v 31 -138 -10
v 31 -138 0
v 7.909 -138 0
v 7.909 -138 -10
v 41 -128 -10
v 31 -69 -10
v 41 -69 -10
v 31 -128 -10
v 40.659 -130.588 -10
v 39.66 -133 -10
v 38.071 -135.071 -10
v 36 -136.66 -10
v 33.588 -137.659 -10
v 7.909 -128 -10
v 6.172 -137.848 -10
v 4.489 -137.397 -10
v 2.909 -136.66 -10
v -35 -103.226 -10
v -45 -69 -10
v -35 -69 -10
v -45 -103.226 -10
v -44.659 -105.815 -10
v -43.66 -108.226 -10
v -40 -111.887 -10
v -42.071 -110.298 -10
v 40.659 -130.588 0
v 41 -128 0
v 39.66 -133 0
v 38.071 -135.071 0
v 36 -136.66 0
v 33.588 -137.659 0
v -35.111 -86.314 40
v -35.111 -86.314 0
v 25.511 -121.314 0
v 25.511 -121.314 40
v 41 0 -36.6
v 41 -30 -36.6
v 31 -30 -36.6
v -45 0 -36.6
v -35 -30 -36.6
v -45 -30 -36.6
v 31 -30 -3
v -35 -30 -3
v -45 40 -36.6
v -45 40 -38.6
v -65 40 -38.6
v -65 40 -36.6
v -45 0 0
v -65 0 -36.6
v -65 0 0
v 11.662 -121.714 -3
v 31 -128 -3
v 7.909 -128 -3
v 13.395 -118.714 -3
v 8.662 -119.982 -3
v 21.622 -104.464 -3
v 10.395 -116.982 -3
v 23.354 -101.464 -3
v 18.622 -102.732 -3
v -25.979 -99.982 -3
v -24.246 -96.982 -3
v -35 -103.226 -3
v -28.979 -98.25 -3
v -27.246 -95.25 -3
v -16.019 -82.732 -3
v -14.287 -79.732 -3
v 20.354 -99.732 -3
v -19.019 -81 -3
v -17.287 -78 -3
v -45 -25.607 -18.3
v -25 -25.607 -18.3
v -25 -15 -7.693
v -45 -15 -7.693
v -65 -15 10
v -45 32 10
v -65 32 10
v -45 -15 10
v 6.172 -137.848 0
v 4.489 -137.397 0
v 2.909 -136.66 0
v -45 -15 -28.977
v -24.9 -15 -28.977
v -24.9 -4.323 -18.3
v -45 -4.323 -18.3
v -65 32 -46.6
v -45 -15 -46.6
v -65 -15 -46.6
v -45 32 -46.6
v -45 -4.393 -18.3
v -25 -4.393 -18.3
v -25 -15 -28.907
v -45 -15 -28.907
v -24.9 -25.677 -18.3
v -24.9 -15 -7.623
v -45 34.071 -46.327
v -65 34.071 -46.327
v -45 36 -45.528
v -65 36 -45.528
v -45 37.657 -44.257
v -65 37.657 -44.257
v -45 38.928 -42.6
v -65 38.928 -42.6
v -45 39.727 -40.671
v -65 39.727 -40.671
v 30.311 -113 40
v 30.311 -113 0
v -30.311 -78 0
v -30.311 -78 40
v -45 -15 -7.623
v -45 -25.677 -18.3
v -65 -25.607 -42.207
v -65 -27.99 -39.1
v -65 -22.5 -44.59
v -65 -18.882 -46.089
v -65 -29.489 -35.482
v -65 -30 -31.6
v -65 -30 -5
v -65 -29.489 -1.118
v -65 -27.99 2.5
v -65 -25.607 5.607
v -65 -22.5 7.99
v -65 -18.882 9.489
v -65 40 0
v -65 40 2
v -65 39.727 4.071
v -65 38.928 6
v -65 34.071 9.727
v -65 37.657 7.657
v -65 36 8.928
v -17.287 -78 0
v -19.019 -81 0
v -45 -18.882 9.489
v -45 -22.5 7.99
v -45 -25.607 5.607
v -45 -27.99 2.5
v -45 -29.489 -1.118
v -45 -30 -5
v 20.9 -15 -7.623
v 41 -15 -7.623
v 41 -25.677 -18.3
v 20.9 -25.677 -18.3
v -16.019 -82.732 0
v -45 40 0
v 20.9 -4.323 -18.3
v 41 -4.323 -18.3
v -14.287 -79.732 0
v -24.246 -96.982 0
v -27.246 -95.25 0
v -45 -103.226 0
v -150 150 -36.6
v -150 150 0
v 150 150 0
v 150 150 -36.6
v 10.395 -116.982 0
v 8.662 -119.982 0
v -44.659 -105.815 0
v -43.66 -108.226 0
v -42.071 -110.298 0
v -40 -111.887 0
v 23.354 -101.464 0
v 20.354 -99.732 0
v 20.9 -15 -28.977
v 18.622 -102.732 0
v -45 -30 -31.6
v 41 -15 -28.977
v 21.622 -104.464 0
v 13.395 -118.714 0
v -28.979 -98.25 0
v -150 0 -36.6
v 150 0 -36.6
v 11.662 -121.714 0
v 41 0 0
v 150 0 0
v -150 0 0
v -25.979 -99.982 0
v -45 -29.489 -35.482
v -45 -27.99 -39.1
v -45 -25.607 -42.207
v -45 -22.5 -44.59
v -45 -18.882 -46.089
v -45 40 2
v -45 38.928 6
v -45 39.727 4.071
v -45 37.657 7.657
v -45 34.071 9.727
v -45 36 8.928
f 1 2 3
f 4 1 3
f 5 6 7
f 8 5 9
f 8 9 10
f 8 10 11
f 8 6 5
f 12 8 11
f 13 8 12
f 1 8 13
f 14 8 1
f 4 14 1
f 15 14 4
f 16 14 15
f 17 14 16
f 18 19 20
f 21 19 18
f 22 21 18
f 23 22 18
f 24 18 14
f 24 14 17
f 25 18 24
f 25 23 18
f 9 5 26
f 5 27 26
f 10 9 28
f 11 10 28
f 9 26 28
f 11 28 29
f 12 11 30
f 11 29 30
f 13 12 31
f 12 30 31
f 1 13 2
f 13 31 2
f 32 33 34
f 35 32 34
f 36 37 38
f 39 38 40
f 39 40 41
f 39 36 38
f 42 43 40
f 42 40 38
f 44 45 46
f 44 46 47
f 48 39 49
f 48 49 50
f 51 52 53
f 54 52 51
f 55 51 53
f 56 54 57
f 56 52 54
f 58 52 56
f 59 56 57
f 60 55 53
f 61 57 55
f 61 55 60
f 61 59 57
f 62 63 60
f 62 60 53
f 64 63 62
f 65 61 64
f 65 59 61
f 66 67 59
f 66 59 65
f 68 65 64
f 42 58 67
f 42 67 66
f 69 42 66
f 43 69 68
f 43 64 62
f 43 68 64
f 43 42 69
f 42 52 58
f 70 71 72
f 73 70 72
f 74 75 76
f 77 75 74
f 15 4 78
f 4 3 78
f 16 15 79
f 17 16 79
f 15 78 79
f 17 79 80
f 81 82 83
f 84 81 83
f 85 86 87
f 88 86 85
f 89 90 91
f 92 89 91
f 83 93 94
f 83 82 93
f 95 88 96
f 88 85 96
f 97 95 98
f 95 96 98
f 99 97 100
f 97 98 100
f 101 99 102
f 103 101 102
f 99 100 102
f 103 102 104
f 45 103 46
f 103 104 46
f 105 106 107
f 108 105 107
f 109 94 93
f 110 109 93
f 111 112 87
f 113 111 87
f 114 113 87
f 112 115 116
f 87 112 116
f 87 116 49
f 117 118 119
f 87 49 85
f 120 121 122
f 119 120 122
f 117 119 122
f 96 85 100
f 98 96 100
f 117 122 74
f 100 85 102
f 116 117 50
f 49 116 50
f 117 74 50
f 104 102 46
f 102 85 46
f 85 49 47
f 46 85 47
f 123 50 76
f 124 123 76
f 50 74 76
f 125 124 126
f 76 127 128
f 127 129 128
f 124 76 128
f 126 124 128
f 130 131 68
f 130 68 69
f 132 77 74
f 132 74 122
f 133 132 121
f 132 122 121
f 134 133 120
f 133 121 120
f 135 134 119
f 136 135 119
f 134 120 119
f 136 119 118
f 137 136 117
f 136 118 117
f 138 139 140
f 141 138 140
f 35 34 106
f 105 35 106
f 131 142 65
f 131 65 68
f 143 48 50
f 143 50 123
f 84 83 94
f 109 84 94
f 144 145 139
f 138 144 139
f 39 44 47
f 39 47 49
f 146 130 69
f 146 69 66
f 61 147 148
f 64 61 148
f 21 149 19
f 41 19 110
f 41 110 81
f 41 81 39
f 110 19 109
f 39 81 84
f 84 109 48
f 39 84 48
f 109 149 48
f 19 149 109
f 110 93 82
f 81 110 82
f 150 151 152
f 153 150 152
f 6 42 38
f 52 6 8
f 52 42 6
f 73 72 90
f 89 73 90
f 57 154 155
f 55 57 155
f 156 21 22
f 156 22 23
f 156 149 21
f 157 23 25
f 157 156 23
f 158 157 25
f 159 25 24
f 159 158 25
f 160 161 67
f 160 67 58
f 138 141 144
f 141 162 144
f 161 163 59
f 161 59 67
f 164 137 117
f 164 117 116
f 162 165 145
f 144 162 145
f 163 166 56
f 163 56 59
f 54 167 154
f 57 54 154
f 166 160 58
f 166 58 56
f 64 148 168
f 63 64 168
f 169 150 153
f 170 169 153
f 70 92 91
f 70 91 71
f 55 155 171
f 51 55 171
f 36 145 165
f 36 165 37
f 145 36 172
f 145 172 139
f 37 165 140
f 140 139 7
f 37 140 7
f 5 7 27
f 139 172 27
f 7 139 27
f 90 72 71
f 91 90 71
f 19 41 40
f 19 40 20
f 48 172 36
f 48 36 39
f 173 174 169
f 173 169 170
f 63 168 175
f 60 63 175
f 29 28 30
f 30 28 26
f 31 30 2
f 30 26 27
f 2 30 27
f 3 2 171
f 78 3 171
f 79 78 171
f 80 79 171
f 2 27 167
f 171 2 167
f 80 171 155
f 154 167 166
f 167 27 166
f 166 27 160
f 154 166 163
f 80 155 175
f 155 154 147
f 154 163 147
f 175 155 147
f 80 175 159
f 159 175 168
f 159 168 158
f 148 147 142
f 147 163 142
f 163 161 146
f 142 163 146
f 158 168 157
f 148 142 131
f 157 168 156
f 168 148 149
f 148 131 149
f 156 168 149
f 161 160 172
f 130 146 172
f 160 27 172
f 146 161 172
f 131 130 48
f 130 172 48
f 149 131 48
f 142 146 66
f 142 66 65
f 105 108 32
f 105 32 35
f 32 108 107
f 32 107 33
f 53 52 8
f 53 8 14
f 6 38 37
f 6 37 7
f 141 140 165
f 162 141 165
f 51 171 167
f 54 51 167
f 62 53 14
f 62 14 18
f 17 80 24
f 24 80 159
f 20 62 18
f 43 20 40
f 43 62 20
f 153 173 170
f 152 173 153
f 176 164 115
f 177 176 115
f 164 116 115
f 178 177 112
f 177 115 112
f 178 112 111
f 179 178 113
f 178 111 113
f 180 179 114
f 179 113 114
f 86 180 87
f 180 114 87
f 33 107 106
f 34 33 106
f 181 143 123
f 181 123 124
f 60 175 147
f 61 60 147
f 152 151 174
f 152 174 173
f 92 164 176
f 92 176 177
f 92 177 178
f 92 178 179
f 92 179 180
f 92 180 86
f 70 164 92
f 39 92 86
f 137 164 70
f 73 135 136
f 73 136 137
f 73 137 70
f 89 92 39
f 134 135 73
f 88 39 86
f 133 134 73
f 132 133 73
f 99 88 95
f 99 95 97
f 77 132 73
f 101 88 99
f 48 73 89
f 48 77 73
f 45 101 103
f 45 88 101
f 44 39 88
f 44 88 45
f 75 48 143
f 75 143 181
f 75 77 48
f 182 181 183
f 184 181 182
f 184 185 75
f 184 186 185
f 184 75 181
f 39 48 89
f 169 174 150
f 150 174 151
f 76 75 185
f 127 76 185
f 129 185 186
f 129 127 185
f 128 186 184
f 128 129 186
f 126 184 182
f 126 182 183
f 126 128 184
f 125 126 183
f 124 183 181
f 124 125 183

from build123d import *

# Parameters (mm, degrees)
PAD_DEPTH       = 40
SKETCH001_W     = 300
SKETCH001_H     = 150
PAD001_DEPTH    = 36.6
PAD002_DEPTH    = 3
PAD003_DEPTH    = 33.6
POCKET_DEPTH    = 86.001
POCKET001_DEPTH = 86.001
SKETCH006_W     = 45.8
SKETCH006_H     = 36.6
PAD004_DEPTH    = 30
POCKET002_DEPTH = 3
FILLET_R        = 10
PAD005_DEPTH    = 20
PAD006_DEPTH    = 20
FILLET001_R     = 15
FILLET002_R     = 8


with BuildPart() as dish_rack_body:
    # Sketch → Pad (new body)
    with BuildSketch(Plane.XY):
        Polygon((30.310889, -113), (-30.310889, -78), (-35.110889, -86.313844), (25.510889, -121.313844), align=None)
    extrude(amount=PAD_DEPTH)


with BuildPart() as kitchen_counter:
    # Sketch001 → Pad001 (new body)
    with BuildSketch(Plane.XY):
        with Locations((0, 75)):
            Rectangle(SKETCH001_W, SKETCH001_H)
    extrude(amount=-PAD001_DEPTH)


with BuildPart() as rack_bracket:
    # Sketch002 → Pad002 (new body)
    with BuildSketch(Plane.XY):
        Polygon((-45, 0), (41, 0), (41, -138), (5.229473, -138), (-45, -109), align=None)
    extrude(amount=-PAD002_DEPTH)

    # Sketch003 (on Face7 of Pad002) → Pad003 (join)
    with BuildSketch(Plane(origin=(0, 0, -3), x_dir=(1, 0, 0), z_dir=(0, 0, -1))):
        Polygon((-45, 109), (-45, 0), (41, 0), (41, 138), (5.229473, 138), align=None)
        Polygon((-35, 30), (31, 30), (31, 128), (7.908965, 128), (-35, 103.226497), align=None, mode=Mode.SUBTRACT)
    extrude(amount=PAD003_DEPTH)

    # Sketch004 (on Face10 of Pad003) → Pocket (cut, through all)
    with BuildSketch(Plane(origin=(-45, 0, 0), x_dir=(0, -1, 0), z_dir=(-1, 0, 0))):
        Polygon((30, -36.6), (69, -10), (138, -10), (138, -36.6), align=None)
    extrude(amount=-POCKET_DEPTH, mode=Mode.SUBTRACT)

    # Sketch005 (on Face3 of Pocket) → Pocket001 (cut, through all)
    with BuildSketch(Plane.YZ.offset(41)):
        Polygon((-15, -7.622688), (-25.677312, -18.3), (-15, -28.977312), (-4.322688, -18.3), align=None)
    extrude(amount=-POCKET001_DEPTH, mode=Mode.SUBTRACT)

    # Sketch006 (on Face2 of Pocket001) → Pad004 (join)
    with BuildSketch(Plane(origin=(0, 0, 0), x_dir=(-1, 0, 0), z_dir=(0, 1, 0))):
        with Locations((2, -18.3)):
            Rectangle(SKETCH006_W, SKETCH006_H)
    extrude(amount=-PAD004_DEPTH)

    # Sketch007 (on Face23 of Pad004) → Pocket002 (cut)
    with BuildSketch(Plane.XY):
        Polygon((-19.019238, -81), (-17.287187, -78), (-14.287187, -79.732051), (-16.019238, -82.732051), align=None)
        Polygon((18.621778, -102.732051), (20.353829, -99.732051), (23.353829, -101.464102), (21.621778, -104.464102), align=None)
        Polygon((-27.246479, -95.25), (-28.97853, -98.25), (-25.97853, -99.982051), (-24.246479, -96.982051), align=None)
        Polygon((10.394537, -116.982051), (8.662486, -119.982051), (11.662486, -121.714102), (13.394537, -118.714102), align=None)
    extrude(amount=-POCKET002_DEPTH, mode=Mode.SUBTRACT)

    # Fillet
    fillet_edges = [rack_bracket.edges().sort_by_distance(p)[0] for p in [
        (-45, -109, -5),
        (5.229473, -138, -5),
        (41, -138, -5),
    ]]
    fillet(fillet_edges, radius=FILLET_R)


with BuildPart() as support_bracket:
    # Sketch008 (on Face12 of ShapeBinder) → Pad005 (new body)
    with BuildSketch(Plane(origin=(-45, 0, 0), x_dir=(0, -1, 0), z_dir=(-1, 0, 0))):
        Polygon((0, 0), (-40, 0), (-40, 10), (30, 10), (30, -46.6), (-40, -46.6), (-40, -36.6), (0, -36.6), align=None)
    extrude(amount=PAD005_DEPTH)

    # Sketch009 (on Face9 of Pad005) → Pad006 (join)
    with BuildSketch(Plane.YZ.offset(-45)):
        Polygon((-15, -7.693398), (-4.393398, -18.3), (-15, -28.906602), (-25.606602, -18.3), align=None)
    extrude(amount=PAD006_DEPTH)

    # Fillet001
    fillet001_edges = [support_bracket.edges().sort_by_distance(p)[0] for p in [
        (-55, -30, -46.6),
        (-55, -30, 10),
    ]]
    fillet(fillet001_edges, radius=FILLET001_R)

    # Fillet002
    fillet002_edges = [support_bracket.edges().sort_by_distance(p)[0] for p in [
        (-55, 40, 10),
        (-55, 40, -46.6),
    ]]
    fillet(fillet002_edges, radius=FILLET002_R)


solid = Compound([dish_rack_body.part, kitchen_counter.part, rack_bracket.part, support_bracket.part])
